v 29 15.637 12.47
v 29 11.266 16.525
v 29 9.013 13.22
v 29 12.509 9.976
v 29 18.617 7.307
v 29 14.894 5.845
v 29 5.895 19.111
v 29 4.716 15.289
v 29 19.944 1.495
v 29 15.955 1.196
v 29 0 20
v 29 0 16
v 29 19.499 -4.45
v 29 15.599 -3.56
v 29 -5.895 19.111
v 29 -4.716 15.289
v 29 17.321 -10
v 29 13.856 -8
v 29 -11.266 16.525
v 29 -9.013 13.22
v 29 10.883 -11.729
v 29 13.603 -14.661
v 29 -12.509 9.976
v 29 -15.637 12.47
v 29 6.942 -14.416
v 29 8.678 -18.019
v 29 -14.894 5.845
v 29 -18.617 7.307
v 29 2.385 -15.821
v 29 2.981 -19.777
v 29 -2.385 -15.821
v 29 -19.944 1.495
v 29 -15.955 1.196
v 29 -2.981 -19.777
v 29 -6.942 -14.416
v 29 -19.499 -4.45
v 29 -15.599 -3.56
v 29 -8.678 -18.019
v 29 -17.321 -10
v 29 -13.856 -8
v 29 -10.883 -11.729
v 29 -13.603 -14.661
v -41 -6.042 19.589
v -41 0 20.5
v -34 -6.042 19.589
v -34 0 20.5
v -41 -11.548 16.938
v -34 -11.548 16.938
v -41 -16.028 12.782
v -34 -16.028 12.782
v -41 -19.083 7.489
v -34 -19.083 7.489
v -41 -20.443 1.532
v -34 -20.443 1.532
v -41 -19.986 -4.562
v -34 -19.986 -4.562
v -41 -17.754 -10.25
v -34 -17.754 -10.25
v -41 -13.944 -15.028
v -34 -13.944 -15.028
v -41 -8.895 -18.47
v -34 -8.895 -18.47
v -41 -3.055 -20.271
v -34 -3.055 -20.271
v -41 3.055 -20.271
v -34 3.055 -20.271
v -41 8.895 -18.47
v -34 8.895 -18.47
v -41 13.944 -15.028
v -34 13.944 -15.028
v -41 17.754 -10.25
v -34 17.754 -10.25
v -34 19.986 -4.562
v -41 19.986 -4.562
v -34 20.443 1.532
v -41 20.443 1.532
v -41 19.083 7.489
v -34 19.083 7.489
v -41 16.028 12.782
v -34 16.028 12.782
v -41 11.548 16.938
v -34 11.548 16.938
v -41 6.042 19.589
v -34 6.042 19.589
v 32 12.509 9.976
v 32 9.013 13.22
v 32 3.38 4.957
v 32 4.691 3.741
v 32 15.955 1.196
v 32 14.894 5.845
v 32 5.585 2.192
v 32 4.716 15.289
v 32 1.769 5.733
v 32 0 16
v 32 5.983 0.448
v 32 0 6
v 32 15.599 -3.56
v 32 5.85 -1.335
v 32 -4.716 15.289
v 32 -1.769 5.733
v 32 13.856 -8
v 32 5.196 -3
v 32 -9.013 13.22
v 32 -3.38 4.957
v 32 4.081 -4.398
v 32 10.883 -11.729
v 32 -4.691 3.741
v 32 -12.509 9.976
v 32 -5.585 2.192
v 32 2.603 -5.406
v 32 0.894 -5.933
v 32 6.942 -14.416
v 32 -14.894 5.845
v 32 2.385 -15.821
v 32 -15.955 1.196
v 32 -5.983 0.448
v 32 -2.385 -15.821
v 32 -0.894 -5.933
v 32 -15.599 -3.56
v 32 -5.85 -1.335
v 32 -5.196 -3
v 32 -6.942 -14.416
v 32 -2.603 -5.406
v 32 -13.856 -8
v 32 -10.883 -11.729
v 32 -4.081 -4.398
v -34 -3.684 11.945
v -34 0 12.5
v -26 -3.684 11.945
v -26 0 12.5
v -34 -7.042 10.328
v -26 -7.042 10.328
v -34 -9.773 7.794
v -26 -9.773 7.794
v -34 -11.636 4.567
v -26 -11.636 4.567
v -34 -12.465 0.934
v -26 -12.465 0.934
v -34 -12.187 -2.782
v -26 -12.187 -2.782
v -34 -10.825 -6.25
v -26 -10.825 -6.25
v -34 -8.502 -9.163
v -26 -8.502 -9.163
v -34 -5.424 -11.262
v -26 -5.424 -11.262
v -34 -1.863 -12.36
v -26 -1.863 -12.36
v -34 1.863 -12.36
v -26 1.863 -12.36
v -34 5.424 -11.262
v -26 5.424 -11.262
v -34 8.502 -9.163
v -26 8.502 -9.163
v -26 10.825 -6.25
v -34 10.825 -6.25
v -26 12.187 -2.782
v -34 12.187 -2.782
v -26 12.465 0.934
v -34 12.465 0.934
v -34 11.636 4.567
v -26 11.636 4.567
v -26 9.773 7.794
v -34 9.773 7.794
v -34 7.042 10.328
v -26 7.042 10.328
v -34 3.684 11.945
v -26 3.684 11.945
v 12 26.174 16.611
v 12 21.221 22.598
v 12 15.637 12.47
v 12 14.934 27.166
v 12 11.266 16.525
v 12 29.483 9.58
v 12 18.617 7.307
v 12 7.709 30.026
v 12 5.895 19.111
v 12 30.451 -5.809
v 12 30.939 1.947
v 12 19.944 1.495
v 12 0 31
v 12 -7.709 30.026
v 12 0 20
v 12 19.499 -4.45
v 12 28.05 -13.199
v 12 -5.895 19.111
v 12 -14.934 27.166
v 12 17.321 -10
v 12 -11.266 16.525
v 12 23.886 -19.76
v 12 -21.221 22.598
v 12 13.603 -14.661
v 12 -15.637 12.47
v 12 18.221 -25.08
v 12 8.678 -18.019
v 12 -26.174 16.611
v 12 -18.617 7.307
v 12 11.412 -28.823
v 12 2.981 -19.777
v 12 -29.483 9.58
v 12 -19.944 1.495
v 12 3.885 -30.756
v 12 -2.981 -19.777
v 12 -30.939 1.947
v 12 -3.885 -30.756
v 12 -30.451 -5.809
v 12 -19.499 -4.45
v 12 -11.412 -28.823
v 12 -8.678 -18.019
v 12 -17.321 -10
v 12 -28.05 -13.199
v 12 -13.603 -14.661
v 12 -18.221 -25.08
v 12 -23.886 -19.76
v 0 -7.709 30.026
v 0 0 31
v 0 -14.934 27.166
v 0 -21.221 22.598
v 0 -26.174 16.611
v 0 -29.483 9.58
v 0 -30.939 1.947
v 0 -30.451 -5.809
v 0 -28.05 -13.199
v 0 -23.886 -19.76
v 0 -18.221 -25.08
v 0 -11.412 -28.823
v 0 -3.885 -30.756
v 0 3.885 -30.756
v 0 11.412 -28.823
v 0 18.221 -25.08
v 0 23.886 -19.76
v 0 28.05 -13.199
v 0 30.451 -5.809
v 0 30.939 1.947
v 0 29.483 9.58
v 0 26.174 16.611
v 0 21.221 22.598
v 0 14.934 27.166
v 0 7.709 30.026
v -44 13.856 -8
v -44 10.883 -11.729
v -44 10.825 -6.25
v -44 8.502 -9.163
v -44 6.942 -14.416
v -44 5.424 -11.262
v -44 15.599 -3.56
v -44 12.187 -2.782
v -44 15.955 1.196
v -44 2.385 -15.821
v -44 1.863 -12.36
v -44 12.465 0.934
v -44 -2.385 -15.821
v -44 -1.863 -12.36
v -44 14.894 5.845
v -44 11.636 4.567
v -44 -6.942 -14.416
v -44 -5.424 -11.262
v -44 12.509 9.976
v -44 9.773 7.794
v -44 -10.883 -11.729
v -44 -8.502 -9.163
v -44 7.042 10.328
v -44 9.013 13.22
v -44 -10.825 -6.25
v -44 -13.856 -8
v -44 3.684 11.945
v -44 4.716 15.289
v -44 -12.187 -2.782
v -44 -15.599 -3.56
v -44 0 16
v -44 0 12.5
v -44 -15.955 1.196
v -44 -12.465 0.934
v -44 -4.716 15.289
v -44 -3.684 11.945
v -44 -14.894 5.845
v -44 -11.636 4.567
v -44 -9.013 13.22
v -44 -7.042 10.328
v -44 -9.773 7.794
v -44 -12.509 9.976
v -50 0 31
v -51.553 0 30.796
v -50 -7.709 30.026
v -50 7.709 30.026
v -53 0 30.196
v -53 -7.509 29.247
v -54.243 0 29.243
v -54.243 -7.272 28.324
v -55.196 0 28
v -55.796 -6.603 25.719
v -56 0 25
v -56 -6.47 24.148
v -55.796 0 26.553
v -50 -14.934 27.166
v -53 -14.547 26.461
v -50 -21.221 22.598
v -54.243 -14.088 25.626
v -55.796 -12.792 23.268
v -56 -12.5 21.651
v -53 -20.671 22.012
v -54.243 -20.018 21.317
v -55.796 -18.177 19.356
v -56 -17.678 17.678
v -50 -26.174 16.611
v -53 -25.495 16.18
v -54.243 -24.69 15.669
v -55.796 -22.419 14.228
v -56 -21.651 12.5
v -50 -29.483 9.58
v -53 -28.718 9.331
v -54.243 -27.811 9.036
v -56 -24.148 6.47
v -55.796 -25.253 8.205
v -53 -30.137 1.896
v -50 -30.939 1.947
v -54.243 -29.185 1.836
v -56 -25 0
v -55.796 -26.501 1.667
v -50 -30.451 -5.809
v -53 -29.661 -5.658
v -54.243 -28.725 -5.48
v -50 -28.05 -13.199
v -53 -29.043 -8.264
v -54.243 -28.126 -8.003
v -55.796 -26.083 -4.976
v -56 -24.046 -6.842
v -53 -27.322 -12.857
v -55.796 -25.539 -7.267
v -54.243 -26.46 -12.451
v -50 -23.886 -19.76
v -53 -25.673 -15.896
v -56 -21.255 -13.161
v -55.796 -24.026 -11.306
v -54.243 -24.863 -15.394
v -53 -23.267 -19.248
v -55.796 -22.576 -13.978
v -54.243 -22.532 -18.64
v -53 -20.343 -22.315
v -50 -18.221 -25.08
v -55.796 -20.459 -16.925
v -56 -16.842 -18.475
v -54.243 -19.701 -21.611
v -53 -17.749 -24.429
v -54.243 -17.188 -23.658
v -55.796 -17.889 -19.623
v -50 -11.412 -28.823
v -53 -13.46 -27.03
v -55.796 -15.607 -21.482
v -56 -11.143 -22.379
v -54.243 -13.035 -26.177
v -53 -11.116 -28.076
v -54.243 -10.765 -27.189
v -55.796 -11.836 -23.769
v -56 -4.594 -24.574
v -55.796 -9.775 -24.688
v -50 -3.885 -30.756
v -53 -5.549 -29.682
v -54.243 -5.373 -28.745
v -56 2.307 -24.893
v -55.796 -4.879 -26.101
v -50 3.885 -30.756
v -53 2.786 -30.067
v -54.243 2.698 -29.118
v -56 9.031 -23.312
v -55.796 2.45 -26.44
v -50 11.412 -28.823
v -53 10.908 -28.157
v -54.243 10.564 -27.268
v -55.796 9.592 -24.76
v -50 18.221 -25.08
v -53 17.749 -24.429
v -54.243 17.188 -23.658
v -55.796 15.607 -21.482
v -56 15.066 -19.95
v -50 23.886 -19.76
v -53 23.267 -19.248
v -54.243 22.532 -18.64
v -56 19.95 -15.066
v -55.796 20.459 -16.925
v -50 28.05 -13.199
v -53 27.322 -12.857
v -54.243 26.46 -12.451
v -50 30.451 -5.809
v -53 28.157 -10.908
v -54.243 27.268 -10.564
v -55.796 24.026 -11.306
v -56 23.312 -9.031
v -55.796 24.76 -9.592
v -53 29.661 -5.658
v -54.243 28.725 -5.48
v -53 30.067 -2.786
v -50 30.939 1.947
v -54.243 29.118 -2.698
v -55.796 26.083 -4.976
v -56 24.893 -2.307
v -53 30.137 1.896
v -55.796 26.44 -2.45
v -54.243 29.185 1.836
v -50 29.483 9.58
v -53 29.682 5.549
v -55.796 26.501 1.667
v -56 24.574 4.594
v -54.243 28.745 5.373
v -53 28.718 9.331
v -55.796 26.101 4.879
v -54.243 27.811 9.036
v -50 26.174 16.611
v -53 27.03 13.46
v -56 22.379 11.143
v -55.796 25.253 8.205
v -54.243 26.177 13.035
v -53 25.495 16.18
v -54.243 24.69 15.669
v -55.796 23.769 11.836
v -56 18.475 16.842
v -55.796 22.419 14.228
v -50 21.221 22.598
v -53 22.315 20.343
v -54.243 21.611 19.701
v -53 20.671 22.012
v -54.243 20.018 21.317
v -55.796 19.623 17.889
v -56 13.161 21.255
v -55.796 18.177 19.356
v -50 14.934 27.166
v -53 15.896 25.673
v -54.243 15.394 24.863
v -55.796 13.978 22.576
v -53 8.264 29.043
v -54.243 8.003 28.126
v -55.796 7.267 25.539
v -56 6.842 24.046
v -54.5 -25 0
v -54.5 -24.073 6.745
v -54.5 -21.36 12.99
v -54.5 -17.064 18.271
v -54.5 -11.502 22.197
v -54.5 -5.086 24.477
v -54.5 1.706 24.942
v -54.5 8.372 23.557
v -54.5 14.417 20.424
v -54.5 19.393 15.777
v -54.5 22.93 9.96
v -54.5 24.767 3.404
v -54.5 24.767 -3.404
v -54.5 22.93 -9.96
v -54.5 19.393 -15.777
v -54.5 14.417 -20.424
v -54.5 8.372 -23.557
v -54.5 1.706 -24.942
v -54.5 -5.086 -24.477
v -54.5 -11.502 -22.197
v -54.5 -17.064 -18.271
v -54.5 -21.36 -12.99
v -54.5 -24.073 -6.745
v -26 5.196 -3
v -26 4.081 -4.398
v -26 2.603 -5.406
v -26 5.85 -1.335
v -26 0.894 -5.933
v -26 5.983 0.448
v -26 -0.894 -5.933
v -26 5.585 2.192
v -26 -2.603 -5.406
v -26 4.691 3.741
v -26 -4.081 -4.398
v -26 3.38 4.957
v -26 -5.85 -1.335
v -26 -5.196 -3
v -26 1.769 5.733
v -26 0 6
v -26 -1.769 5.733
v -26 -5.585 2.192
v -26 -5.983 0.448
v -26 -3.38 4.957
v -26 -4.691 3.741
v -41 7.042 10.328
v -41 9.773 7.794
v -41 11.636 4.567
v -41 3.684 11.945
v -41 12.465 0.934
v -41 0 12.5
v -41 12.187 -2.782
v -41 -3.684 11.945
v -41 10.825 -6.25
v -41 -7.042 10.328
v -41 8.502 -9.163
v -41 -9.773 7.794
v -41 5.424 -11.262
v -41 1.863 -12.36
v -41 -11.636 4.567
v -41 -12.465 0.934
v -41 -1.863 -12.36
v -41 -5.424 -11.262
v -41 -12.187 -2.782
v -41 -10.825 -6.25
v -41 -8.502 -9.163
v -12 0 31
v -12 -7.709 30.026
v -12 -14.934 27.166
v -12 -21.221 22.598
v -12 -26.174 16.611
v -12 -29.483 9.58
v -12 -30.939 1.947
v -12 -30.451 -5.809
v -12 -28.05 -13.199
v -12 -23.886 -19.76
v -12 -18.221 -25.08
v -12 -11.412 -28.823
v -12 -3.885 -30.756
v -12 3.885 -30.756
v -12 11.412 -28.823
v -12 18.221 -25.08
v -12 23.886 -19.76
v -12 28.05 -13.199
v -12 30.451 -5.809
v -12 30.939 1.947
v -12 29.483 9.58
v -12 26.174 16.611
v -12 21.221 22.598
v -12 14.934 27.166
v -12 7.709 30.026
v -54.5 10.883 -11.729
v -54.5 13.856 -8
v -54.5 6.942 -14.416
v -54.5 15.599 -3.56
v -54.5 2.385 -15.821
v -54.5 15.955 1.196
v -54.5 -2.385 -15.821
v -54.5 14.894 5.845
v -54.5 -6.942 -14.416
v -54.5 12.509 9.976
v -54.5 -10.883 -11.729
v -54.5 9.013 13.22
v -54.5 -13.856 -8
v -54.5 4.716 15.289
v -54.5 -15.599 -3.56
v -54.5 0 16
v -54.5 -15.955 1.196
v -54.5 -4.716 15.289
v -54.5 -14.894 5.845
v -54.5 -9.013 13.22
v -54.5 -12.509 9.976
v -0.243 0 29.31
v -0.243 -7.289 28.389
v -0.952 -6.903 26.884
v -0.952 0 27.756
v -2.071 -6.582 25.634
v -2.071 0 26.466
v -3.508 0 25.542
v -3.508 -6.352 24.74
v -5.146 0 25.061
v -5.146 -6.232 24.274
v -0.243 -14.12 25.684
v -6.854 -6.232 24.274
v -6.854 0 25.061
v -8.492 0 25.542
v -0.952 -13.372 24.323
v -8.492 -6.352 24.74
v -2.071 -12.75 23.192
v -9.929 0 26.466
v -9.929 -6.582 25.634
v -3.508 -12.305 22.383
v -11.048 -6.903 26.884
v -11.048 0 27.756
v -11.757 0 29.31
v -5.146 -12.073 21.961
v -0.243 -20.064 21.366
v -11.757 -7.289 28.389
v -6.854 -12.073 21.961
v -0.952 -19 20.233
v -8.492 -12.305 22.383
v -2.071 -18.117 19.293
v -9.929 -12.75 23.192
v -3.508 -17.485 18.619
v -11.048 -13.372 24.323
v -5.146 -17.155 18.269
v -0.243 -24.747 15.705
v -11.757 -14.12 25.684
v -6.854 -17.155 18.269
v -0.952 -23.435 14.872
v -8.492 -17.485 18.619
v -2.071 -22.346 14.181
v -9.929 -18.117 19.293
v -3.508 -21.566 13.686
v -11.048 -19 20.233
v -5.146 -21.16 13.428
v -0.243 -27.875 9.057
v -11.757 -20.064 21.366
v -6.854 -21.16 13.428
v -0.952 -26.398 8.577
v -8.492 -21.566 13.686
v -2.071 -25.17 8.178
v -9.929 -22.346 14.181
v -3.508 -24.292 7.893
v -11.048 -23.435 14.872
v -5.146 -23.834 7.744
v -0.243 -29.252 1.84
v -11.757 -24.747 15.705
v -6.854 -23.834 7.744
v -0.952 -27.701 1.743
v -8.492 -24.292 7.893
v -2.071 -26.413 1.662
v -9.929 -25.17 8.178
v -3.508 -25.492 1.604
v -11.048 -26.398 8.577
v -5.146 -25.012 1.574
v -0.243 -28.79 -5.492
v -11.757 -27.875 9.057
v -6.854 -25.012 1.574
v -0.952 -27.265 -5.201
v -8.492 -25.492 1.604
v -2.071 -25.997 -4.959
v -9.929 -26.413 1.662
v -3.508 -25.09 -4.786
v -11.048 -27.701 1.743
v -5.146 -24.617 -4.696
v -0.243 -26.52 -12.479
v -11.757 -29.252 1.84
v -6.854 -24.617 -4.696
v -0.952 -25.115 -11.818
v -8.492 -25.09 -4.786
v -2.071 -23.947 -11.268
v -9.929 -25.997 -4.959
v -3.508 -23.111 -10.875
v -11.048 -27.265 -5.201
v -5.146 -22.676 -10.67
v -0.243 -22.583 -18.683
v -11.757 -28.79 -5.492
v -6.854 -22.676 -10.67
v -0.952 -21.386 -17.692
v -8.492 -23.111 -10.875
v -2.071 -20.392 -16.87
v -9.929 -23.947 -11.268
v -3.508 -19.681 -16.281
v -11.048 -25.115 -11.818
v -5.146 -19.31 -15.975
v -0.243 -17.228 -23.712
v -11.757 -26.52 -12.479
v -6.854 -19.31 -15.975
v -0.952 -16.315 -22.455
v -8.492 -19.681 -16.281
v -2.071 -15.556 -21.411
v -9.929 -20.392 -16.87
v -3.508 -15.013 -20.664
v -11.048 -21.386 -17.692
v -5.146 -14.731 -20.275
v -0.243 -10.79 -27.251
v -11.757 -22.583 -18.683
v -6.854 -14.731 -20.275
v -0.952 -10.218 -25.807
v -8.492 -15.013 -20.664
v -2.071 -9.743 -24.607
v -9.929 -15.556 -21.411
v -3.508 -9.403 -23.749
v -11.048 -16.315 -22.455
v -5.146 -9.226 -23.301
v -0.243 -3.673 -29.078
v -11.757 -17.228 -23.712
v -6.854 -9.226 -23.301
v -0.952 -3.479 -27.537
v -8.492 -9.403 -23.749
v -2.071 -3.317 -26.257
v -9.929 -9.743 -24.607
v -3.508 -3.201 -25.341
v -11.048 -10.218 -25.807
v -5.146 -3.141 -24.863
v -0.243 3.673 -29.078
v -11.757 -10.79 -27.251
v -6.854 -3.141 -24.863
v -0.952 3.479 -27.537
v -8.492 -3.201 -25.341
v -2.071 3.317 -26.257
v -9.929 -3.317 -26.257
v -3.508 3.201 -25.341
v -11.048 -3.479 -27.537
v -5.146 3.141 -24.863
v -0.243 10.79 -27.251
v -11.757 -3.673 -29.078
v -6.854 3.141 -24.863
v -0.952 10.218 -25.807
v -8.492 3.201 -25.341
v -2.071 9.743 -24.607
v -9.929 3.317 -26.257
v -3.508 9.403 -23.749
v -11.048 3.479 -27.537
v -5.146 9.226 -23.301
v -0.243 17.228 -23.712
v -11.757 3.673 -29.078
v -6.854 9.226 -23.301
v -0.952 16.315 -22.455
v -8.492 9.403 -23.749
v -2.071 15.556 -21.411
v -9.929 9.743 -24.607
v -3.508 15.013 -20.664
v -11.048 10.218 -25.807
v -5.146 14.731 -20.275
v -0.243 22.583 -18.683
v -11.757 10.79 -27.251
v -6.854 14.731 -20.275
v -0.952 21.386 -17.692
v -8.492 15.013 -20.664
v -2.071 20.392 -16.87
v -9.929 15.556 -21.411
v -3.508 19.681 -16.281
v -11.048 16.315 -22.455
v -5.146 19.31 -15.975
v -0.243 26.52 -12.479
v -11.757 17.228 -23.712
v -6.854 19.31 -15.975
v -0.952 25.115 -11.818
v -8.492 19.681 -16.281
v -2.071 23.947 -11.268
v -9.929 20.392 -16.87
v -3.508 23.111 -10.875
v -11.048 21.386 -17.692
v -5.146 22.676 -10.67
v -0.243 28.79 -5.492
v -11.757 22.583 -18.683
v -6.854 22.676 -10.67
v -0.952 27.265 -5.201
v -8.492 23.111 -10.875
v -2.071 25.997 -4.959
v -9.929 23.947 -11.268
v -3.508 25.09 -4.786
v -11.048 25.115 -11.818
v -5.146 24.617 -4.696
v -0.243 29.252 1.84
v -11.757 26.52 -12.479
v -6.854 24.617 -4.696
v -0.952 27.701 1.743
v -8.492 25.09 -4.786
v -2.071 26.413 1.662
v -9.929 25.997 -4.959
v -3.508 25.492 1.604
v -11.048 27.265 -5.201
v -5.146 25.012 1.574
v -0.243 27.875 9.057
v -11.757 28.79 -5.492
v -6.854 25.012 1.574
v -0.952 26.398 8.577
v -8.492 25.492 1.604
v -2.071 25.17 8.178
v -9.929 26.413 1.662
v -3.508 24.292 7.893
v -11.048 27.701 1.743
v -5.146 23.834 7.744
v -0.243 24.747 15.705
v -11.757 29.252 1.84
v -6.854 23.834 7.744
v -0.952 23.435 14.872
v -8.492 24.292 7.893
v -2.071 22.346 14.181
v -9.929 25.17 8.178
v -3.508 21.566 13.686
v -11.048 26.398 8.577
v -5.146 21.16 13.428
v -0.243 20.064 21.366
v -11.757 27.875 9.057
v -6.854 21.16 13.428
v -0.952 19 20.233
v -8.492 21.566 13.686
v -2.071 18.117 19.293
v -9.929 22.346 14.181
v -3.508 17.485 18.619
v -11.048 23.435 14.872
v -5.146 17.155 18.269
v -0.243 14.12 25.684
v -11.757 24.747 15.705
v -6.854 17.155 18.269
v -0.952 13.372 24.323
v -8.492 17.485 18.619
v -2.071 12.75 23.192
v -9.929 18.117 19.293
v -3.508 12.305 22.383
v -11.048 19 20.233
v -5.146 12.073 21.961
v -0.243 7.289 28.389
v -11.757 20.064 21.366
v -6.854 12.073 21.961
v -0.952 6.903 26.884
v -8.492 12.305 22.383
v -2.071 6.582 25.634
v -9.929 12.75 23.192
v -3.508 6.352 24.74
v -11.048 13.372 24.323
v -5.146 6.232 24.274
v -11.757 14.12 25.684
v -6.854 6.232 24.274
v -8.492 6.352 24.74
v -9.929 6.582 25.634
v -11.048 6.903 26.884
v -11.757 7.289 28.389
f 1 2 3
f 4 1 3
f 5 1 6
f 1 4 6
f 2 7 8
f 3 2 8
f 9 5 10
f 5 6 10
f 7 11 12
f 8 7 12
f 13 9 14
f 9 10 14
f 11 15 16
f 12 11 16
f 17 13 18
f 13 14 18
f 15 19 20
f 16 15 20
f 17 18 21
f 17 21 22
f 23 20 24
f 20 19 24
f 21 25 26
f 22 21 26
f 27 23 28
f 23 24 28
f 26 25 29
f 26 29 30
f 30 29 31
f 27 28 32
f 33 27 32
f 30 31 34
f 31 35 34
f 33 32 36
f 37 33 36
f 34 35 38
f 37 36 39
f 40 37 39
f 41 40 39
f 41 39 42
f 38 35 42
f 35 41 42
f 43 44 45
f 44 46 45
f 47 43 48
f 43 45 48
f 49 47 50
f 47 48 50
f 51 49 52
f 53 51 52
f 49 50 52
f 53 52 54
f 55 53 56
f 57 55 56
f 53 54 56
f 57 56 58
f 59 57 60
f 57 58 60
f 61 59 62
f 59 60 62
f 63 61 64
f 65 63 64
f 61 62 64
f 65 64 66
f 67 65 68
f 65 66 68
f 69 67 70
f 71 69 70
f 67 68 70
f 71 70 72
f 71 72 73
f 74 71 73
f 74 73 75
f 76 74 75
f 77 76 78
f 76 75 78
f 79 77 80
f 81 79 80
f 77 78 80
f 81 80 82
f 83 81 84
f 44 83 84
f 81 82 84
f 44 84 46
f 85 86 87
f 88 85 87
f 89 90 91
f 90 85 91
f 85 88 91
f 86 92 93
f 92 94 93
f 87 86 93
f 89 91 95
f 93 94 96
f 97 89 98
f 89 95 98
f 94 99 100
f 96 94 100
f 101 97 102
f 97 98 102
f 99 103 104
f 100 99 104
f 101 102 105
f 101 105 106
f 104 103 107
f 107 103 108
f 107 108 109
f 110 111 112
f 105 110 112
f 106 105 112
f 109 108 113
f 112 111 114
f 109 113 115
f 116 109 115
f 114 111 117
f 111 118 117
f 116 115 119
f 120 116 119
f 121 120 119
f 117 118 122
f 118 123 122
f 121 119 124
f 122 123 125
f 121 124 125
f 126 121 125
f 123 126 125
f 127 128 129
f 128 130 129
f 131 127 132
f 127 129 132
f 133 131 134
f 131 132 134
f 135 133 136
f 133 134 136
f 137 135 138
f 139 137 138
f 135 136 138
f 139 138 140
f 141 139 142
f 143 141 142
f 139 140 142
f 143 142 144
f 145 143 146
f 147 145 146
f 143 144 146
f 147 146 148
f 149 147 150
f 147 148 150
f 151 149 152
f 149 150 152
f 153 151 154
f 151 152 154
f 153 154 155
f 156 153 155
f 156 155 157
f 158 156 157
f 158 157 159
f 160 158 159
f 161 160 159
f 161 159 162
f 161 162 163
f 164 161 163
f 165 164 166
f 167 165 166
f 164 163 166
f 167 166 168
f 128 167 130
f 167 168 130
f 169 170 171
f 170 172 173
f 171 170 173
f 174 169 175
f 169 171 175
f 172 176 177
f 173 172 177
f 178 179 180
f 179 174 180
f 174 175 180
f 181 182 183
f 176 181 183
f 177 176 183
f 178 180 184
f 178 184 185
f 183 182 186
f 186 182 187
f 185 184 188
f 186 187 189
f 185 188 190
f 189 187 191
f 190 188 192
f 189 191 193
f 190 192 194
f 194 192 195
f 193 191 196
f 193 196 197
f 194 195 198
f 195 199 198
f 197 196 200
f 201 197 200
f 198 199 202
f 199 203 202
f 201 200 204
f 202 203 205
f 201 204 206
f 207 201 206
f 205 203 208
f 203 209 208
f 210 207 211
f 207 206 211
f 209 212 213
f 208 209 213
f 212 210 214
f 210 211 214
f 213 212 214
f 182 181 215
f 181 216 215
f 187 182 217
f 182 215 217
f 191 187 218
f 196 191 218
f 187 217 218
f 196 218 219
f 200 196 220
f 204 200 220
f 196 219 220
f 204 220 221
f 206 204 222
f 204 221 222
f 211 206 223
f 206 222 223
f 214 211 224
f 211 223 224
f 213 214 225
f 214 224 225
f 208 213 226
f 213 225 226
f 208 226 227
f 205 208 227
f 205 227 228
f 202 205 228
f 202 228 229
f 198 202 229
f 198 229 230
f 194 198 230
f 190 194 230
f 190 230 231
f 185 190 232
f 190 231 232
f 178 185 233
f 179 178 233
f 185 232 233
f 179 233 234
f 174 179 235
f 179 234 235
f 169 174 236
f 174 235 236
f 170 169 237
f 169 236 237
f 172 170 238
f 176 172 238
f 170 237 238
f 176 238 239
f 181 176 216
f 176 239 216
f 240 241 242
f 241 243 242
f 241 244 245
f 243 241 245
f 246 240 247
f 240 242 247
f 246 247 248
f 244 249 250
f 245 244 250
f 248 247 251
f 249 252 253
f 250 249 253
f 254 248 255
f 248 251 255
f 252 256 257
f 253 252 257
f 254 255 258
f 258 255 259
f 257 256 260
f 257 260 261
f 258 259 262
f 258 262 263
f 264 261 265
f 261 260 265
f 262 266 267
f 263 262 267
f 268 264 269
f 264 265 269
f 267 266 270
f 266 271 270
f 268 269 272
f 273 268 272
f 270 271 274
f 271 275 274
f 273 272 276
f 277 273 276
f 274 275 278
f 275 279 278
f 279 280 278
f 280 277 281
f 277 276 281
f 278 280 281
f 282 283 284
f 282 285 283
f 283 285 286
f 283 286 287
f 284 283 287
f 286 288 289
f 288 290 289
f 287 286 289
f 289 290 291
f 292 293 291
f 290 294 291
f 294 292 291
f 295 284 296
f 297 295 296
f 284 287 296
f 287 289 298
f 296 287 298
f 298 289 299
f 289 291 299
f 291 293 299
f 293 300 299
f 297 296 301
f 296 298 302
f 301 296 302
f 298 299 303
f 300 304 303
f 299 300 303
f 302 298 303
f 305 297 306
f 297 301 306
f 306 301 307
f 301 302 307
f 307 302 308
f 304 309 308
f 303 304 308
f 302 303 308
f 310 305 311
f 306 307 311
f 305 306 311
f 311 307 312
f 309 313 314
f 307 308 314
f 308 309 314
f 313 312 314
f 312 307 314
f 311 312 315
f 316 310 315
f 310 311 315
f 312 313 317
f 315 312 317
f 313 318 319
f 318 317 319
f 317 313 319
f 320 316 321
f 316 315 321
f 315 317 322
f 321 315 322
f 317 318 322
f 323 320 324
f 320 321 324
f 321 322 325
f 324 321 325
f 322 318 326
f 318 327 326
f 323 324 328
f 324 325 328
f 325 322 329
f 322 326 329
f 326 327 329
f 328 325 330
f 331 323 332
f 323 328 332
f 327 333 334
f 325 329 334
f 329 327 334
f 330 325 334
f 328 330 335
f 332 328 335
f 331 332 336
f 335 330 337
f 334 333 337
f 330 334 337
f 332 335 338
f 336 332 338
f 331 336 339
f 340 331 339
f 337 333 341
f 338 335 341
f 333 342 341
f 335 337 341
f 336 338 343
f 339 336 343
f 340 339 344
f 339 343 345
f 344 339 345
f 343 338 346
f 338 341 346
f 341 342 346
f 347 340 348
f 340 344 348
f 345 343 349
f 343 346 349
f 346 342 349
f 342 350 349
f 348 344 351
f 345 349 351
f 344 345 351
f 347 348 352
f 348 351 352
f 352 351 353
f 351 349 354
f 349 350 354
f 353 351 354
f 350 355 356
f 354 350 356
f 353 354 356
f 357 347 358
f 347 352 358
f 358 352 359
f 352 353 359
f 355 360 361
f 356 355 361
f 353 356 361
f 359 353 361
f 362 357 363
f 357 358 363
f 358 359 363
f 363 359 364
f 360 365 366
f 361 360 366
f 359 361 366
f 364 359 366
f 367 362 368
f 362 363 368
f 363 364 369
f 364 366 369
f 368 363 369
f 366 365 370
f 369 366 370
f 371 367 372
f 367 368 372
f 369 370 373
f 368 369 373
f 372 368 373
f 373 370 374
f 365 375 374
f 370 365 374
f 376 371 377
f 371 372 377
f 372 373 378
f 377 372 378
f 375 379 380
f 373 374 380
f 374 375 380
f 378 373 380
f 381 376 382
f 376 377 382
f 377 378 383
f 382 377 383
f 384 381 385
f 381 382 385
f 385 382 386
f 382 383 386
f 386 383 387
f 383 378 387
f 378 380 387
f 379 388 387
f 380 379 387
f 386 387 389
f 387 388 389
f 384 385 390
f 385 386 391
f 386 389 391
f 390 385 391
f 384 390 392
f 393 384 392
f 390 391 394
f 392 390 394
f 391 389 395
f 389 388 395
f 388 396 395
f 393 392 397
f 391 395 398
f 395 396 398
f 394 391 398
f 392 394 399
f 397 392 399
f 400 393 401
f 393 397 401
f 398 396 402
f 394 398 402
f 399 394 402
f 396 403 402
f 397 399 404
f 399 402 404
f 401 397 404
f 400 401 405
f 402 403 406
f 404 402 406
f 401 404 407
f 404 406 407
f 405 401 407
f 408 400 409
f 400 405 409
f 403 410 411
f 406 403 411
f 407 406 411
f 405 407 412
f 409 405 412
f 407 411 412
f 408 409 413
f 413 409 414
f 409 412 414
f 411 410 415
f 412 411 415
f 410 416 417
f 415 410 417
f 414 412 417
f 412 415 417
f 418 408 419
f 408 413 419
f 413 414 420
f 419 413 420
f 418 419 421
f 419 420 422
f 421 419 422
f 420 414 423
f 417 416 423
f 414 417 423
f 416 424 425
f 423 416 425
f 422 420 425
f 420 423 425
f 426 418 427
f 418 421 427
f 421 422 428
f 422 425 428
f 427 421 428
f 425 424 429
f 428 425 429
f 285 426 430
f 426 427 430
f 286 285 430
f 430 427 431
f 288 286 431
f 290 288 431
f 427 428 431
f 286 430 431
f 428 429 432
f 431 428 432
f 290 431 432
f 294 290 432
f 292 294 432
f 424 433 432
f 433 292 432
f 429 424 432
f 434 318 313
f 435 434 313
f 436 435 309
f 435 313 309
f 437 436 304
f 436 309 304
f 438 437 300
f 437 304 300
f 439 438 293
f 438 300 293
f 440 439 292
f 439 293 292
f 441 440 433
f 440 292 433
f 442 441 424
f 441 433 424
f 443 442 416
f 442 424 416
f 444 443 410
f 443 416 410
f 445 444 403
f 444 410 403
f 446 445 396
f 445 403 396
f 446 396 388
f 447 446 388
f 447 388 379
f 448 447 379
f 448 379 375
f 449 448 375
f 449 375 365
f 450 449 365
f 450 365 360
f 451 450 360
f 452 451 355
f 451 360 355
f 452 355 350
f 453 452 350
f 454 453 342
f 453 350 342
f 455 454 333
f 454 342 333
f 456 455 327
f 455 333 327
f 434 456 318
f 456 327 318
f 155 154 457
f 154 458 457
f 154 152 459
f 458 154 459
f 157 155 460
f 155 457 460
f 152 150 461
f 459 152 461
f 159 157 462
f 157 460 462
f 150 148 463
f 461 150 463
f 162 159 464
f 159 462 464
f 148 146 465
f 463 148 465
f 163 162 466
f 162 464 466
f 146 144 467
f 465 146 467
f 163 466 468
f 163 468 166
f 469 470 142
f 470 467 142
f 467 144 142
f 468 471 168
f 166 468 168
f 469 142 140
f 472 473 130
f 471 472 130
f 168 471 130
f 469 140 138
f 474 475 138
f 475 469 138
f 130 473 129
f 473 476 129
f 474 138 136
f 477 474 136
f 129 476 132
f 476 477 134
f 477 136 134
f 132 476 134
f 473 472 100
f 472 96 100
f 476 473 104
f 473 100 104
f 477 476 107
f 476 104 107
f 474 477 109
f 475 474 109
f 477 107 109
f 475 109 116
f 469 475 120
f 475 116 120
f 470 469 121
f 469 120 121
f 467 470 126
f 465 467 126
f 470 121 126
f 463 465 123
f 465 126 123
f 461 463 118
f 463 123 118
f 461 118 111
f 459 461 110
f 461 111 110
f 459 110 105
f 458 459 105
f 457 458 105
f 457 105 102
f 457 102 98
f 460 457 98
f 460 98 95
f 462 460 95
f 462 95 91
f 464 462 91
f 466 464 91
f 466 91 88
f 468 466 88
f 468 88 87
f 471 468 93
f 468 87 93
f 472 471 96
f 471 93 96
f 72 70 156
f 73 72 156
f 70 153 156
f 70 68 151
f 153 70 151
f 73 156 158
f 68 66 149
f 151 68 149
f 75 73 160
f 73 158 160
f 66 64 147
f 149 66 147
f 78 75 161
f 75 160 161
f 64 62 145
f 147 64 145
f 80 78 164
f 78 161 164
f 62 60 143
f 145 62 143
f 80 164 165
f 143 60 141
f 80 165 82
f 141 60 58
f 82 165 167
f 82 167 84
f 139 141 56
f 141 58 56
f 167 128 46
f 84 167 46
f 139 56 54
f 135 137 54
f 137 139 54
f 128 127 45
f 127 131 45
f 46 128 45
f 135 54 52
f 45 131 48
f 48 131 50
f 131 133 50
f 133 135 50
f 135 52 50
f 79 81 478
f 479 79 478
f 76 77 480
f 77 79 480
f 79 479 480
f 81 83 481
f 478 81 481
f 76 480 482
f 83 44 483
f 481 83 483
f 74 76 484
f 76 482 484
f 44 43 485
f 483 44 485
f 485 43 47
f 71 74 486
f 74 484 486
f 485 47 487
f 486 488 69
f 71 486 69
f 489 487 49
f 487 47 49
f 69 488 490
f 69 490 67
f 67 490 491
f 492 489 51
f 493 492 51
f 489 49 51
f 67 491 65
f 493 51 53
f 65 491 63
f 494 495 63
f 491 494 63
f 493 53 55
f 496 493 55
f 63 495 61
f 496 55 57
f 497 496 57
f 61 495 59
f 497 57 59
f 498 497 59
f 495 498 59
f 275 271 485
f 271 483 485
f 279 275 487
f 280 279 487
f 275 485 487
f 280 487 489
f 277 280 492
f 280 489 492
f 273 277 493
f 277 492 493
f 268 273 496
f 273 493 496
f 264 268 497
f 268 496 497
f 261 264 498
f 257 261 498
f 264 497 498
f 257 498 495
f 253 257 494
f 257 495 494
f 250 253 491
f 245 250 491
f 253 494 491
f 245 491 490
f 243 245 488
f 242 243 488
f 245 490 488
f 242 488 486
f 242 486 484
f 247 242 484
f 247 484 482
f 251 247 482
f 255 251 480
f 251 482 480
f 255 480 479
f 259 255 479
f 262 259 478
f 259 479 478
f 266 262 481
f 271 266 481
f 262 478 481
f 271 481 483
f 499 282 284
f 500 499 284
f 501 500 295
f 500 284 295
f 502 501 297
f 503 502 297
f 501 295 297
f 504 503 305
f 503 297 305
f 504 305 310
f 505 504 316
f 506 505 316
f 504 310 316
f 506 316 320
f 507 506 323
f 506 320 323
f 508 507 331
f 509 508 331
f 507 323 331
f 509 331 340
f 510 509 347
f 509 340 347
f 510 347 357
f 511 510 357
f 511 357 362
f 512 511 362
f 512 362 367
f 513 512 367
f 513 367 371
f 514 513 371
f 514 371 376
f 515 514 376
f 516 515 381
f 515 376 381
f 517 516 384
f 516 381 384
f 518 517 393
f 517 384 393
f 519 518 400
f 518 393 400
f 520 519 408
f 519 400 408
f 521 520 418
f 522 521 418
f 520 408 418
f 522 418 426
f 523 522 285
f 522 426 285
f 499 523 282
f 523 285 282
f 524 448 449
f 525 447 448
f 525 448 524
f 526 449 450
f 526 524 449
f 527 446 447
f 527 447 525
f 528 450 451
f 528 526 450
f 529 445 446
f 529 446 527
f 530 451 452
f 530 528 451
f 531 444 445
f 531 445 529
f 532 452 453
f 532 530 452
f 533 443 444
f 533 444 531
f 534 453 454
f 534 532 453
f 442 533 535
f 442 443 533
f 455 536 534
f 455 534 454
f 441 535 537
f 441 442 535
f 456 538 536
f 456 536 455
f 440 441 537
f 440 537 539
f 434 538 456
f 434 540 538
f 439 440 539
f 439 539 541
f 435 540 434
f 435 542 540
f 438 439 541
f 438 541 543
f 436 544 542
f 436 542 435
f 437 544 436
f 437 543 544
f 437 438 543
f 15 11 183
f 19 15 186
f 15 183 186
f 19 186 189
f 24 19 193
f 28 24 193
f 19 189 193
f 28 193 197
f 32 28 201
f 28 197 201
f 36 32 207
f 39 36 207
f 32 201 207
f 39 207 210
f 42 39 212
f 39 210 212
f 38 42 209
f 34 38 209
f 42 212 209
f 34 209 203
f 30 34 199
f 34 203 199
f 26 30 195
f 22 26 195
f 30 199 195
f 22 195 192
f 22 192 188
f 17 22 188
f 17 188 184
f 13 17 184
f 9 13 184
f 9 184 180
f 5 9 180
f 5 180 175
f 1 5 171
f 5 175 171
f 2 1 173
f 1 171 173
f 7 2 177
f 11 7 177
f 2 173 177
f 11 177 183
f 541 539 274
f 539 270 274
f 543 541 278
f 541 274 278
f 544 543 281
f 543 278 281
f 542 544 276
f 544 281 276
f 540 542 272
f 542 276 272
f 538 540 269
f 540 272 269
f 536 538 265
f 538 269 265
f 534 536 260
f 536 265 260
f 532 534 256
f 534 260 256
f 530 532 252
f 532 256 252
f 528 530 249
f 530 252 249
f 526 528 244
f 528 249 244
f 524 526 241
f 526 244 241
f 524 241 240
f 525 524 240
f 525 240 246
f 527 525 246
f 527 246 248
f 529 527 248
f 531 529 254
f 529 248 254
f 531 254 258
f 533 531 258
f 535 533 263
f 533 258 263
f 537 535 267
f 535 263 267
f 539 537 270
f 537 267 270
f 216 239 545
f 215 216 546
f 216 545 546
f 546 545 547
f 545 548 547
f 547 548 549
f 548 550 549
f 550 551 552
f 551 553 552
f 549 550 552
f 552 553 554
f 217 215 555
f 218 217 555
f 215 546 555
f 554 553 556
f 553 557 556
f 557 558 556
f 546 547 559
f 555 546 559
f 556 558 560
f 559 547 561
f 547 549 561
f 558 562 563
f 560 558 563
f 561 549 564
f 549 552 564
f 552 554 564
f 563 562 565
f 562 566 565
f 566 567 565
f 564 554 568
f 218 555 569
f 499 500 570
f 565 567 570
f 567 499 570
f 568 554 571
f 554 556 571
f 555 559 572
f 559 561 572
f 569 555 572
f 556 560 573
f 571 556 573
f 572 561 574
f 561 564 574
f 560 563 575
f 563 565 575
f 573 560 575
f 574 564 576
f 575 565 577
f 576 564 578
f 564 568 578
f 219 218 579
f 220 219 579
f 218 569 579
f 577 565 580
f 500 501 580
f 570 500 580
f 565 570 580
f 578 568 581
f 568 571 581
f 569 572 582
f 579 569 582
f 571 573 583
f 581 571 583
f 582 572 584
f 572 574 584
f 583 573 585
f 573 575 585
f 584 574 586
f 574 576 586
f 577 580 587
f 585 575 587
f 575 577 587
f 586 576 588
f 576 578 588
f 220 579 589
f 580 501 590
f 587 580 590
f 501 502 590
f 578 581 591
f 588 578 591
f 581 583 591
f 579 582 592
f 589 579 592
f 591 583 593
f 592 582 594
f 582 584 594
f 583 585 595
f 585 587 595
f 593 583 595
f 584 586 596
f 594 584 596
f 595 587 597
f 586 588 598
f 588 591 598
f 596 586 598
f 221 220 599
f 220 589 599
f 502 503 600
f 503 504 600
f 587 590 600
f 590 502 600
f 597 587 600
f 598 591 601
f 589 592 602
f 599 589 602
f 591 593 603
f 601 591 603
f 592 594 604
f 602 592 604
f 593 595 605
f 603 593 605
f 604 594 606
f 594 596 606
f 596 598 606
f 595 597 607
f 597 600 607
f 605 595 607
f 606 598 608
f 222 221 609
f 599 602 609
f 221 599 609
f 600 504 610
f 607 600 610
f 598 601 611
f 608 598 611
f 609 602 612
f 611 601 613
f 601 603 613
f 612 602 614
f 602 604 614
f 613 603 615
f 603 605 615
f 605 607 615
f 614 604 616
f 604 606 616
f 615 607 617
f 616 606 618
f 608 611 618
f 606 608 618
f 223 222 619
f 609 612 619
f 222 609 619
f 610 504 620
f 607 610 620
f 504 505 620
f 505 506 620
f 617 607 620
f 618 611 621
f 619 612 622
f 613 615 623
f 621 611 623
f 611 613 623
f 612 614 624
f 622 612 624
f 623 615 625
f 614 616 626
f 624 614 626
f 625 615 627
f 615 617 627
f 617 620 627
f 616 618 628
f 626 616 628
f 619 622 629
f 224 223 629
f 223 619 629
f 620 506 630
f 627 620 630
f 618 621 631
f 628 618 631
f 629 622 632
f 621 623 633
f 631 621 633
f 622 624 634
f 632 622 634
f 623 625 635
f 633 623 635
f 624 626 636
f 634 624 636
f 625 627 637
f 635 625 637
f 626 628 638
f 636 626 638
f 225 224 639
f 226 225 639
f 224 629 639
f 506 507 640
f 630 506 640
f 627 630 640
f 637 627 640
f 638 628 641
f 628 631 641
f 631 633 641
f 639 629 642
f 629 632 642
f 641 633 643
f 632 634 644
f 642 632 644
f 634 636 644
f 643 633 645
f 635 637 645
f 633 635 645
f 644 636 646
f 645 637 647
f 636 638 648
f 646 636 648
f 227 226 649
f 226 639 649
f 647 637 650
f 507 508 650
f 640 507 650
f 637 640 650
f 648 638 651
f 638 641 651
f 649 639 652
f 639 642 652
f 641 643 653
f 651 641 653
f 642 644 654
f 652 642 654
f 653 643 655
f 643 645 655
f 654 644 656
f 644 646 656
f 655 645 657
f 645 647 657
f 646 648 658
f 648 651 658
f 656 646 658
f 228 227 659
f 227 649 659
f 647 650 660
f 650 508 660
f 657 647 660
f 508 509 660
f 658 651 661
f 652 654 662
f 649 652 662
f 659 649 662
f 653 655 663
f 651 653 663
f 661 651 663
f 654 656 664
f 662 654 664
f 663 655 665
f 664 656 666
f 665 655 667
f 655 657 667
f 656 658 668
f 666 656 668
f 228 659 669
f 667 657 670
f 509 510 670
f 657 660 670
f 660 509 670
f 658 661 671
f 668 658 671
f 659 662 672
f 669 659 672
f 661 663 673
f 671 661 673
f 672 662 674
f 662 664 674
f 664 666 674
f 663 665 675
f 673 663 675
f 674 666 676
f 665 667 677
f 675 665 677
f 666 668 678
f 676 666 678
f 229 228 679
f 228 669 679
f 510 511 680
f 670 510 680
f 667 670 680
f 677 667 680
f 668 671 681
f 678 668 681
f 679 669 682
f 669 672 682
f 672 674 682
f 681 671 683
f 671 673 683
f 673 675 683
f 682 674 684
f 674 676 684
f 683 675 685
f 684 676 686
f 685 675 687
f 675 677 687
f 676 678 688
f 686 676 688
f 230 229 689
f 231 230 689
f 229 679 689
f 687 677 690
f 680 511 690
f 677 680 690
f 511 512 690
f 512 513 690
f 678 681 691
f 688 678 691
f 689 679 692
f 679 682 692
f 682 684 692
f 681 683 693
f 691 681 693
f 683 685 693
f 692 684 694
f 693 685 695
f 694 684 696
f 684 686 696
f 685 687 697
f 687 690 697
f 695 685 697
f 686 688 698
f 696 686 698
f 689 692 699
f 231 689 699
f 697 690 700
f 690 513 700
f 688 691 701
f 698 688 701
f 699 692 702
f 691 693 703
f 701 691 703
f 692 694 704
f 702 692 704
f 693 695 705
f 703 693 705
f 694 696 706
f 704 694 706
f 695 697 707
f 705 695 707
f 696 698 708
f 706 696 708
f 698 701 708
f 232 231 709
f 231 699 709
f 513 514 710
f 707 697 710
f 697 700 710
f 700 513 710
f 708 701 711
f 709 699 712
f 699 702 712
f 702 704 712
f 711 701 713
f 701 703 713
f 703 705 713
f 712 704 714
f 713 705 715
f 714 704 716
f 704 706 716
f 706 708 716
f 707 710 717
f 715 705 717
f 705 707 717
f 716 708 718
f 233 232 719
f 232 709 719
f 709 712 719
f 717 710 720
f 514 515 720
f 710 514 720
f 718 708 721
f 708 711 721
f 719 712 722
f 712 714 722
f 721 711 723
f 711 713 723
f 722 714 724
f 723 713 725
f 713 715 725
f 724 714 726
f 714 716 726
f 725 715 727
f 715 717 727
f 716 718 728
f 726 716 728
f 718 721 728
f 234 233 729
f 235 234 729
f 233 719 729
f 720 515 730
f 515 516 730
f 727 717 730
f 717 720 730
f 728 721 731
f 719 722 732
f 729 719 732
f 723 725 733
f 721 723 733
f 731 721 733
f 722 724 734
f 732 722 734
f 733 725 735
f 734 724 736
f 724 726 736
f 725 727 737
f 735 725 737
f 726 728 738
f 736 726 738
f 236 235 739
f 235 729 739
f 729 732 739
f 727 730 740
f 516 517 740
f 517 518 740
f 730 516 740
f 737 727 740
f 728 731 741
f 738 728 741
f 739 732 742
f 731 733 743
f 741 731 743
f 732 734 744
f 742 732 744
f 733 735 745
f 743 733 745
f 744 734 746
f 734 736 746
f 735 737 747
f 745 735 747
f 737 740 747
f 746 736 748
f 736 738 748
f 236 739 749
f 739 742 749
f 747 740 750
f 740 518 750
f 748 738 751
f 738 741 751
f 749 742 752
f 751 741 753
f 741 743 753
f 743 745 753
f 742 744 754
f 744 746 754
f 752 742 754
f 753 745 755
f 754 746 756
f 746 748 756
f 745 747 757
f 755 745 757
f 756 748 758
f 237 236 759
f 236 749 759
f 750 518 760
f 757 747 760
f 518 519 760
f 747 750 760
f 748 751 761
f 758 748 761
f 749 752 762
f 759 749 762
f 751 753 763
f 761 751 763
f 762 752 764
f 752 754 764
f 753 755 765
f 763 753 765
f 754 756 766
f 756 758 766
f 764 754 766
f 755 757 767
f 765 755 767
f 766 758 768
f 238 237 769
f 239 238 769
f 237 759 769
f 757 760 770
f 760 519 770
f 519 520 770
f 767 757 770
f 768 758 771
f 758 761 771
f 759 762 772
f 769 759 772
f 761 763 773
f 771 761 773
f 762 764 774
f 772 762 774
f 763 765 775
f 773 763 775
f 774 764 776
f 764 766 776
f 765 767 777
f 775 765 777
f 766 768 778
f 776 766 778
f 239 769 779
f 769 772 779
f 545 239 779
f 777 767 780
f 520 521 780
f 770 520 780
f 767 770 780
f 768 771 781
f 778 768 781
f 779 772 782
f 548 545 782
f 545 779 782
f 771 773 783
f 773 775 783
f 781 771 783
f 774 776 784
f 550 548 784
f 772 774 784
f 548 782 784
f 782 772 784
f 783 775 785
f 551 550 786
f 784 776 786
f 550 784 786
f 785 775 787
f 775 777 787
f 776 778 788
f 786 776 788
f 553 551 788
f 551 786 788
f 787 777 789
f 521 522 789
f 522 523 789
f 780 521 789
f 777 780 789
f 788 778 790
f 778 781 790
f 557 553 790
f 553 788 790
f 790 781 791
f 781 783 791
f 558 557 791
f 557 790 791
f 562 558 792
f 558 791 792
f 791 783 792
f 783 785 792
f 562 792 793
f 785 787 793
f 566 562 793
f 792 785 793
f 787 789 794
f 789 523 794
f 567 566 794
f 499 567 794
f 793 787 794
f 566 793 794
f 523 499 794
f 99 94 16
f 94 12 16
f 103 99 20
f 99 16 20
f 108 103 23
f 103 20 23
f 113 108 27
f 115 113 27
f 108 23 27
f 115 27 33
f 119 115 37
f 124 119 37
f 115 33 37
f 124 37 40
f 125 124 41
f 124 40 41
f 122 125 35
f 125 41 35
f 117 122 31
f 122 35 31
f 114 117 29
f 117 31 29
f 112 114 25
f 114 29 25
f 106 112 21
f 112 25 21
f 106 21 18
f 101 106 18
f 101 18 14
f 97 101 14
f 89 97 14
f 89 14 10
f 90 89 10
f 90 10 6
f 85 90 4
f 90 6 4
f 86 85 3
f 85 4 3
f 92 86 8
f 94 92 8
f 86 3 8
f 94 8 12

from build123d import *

# Parameters (mm, degrees)
F2_R        = 6
F1_FACE_R   = 25
F1_FACE_R_2 = 16
F3_DEPTH    = 1.5


with BuildPart() as f1:
    # F0 (on Front) → F1 (revolve)
    with BuildSketch(Plane.XZ):
        with BuildLine():
            Line((-26, 6), (32, 6))
            Line((32, 6), (32, 16))
            Line((32, 16), (29, 16))
            Line((29, 16), (29, 20))
            Line((29, 20), (12, 20))
            Line((12, 20), (12, 31))
            Line((12, 31), (0, 31))
            ThreePointArc((0, 31), (-6, 25), (-12, 31))
            Line((-12, 31), (-56, 31))
            Line((-56, 31), (-56, 16))
            Line((-56, 16), (-44, 16))
            Line((-44, 16), (-44, 12.5))
            Line((-44, 12.5), (-41, 12.5))
            Line((-41, 12.5), (-41, 20.5))
            Line((-41, 20.5), (-34, 20.5))
            Line((-34, 20.5), (-34, 12.5))
            Line((-34, 12.5), (-26, 12.5))
            Line((-26, 12.5), (-26, 6))
        make_face()
    revolve(axis=Axis((0, 0, 0), (1, 0, 0)))

    # F2
    f2_edges = [f1.edges().sort_by_distance(p)[0] for p in [
        (-56, 0, -31),
    ]]
    fillet(f2_edges, radius=F2_R)

    # F1_face (on face) → F3 (cut)
    with BuildSketch(Plane(origin=(-56, 0, 0), x_dir=(0, -1, 0), z_dir=(-1, 0, 0))):
        Circle(F1_FACE_R)
        Circle(F1_FACE_R_2, mode=Mode.SUBTRACT)
    extrude(amount=-F3_DEPTH, mode=Mode.SUBTRACT)


solid = f1.part
